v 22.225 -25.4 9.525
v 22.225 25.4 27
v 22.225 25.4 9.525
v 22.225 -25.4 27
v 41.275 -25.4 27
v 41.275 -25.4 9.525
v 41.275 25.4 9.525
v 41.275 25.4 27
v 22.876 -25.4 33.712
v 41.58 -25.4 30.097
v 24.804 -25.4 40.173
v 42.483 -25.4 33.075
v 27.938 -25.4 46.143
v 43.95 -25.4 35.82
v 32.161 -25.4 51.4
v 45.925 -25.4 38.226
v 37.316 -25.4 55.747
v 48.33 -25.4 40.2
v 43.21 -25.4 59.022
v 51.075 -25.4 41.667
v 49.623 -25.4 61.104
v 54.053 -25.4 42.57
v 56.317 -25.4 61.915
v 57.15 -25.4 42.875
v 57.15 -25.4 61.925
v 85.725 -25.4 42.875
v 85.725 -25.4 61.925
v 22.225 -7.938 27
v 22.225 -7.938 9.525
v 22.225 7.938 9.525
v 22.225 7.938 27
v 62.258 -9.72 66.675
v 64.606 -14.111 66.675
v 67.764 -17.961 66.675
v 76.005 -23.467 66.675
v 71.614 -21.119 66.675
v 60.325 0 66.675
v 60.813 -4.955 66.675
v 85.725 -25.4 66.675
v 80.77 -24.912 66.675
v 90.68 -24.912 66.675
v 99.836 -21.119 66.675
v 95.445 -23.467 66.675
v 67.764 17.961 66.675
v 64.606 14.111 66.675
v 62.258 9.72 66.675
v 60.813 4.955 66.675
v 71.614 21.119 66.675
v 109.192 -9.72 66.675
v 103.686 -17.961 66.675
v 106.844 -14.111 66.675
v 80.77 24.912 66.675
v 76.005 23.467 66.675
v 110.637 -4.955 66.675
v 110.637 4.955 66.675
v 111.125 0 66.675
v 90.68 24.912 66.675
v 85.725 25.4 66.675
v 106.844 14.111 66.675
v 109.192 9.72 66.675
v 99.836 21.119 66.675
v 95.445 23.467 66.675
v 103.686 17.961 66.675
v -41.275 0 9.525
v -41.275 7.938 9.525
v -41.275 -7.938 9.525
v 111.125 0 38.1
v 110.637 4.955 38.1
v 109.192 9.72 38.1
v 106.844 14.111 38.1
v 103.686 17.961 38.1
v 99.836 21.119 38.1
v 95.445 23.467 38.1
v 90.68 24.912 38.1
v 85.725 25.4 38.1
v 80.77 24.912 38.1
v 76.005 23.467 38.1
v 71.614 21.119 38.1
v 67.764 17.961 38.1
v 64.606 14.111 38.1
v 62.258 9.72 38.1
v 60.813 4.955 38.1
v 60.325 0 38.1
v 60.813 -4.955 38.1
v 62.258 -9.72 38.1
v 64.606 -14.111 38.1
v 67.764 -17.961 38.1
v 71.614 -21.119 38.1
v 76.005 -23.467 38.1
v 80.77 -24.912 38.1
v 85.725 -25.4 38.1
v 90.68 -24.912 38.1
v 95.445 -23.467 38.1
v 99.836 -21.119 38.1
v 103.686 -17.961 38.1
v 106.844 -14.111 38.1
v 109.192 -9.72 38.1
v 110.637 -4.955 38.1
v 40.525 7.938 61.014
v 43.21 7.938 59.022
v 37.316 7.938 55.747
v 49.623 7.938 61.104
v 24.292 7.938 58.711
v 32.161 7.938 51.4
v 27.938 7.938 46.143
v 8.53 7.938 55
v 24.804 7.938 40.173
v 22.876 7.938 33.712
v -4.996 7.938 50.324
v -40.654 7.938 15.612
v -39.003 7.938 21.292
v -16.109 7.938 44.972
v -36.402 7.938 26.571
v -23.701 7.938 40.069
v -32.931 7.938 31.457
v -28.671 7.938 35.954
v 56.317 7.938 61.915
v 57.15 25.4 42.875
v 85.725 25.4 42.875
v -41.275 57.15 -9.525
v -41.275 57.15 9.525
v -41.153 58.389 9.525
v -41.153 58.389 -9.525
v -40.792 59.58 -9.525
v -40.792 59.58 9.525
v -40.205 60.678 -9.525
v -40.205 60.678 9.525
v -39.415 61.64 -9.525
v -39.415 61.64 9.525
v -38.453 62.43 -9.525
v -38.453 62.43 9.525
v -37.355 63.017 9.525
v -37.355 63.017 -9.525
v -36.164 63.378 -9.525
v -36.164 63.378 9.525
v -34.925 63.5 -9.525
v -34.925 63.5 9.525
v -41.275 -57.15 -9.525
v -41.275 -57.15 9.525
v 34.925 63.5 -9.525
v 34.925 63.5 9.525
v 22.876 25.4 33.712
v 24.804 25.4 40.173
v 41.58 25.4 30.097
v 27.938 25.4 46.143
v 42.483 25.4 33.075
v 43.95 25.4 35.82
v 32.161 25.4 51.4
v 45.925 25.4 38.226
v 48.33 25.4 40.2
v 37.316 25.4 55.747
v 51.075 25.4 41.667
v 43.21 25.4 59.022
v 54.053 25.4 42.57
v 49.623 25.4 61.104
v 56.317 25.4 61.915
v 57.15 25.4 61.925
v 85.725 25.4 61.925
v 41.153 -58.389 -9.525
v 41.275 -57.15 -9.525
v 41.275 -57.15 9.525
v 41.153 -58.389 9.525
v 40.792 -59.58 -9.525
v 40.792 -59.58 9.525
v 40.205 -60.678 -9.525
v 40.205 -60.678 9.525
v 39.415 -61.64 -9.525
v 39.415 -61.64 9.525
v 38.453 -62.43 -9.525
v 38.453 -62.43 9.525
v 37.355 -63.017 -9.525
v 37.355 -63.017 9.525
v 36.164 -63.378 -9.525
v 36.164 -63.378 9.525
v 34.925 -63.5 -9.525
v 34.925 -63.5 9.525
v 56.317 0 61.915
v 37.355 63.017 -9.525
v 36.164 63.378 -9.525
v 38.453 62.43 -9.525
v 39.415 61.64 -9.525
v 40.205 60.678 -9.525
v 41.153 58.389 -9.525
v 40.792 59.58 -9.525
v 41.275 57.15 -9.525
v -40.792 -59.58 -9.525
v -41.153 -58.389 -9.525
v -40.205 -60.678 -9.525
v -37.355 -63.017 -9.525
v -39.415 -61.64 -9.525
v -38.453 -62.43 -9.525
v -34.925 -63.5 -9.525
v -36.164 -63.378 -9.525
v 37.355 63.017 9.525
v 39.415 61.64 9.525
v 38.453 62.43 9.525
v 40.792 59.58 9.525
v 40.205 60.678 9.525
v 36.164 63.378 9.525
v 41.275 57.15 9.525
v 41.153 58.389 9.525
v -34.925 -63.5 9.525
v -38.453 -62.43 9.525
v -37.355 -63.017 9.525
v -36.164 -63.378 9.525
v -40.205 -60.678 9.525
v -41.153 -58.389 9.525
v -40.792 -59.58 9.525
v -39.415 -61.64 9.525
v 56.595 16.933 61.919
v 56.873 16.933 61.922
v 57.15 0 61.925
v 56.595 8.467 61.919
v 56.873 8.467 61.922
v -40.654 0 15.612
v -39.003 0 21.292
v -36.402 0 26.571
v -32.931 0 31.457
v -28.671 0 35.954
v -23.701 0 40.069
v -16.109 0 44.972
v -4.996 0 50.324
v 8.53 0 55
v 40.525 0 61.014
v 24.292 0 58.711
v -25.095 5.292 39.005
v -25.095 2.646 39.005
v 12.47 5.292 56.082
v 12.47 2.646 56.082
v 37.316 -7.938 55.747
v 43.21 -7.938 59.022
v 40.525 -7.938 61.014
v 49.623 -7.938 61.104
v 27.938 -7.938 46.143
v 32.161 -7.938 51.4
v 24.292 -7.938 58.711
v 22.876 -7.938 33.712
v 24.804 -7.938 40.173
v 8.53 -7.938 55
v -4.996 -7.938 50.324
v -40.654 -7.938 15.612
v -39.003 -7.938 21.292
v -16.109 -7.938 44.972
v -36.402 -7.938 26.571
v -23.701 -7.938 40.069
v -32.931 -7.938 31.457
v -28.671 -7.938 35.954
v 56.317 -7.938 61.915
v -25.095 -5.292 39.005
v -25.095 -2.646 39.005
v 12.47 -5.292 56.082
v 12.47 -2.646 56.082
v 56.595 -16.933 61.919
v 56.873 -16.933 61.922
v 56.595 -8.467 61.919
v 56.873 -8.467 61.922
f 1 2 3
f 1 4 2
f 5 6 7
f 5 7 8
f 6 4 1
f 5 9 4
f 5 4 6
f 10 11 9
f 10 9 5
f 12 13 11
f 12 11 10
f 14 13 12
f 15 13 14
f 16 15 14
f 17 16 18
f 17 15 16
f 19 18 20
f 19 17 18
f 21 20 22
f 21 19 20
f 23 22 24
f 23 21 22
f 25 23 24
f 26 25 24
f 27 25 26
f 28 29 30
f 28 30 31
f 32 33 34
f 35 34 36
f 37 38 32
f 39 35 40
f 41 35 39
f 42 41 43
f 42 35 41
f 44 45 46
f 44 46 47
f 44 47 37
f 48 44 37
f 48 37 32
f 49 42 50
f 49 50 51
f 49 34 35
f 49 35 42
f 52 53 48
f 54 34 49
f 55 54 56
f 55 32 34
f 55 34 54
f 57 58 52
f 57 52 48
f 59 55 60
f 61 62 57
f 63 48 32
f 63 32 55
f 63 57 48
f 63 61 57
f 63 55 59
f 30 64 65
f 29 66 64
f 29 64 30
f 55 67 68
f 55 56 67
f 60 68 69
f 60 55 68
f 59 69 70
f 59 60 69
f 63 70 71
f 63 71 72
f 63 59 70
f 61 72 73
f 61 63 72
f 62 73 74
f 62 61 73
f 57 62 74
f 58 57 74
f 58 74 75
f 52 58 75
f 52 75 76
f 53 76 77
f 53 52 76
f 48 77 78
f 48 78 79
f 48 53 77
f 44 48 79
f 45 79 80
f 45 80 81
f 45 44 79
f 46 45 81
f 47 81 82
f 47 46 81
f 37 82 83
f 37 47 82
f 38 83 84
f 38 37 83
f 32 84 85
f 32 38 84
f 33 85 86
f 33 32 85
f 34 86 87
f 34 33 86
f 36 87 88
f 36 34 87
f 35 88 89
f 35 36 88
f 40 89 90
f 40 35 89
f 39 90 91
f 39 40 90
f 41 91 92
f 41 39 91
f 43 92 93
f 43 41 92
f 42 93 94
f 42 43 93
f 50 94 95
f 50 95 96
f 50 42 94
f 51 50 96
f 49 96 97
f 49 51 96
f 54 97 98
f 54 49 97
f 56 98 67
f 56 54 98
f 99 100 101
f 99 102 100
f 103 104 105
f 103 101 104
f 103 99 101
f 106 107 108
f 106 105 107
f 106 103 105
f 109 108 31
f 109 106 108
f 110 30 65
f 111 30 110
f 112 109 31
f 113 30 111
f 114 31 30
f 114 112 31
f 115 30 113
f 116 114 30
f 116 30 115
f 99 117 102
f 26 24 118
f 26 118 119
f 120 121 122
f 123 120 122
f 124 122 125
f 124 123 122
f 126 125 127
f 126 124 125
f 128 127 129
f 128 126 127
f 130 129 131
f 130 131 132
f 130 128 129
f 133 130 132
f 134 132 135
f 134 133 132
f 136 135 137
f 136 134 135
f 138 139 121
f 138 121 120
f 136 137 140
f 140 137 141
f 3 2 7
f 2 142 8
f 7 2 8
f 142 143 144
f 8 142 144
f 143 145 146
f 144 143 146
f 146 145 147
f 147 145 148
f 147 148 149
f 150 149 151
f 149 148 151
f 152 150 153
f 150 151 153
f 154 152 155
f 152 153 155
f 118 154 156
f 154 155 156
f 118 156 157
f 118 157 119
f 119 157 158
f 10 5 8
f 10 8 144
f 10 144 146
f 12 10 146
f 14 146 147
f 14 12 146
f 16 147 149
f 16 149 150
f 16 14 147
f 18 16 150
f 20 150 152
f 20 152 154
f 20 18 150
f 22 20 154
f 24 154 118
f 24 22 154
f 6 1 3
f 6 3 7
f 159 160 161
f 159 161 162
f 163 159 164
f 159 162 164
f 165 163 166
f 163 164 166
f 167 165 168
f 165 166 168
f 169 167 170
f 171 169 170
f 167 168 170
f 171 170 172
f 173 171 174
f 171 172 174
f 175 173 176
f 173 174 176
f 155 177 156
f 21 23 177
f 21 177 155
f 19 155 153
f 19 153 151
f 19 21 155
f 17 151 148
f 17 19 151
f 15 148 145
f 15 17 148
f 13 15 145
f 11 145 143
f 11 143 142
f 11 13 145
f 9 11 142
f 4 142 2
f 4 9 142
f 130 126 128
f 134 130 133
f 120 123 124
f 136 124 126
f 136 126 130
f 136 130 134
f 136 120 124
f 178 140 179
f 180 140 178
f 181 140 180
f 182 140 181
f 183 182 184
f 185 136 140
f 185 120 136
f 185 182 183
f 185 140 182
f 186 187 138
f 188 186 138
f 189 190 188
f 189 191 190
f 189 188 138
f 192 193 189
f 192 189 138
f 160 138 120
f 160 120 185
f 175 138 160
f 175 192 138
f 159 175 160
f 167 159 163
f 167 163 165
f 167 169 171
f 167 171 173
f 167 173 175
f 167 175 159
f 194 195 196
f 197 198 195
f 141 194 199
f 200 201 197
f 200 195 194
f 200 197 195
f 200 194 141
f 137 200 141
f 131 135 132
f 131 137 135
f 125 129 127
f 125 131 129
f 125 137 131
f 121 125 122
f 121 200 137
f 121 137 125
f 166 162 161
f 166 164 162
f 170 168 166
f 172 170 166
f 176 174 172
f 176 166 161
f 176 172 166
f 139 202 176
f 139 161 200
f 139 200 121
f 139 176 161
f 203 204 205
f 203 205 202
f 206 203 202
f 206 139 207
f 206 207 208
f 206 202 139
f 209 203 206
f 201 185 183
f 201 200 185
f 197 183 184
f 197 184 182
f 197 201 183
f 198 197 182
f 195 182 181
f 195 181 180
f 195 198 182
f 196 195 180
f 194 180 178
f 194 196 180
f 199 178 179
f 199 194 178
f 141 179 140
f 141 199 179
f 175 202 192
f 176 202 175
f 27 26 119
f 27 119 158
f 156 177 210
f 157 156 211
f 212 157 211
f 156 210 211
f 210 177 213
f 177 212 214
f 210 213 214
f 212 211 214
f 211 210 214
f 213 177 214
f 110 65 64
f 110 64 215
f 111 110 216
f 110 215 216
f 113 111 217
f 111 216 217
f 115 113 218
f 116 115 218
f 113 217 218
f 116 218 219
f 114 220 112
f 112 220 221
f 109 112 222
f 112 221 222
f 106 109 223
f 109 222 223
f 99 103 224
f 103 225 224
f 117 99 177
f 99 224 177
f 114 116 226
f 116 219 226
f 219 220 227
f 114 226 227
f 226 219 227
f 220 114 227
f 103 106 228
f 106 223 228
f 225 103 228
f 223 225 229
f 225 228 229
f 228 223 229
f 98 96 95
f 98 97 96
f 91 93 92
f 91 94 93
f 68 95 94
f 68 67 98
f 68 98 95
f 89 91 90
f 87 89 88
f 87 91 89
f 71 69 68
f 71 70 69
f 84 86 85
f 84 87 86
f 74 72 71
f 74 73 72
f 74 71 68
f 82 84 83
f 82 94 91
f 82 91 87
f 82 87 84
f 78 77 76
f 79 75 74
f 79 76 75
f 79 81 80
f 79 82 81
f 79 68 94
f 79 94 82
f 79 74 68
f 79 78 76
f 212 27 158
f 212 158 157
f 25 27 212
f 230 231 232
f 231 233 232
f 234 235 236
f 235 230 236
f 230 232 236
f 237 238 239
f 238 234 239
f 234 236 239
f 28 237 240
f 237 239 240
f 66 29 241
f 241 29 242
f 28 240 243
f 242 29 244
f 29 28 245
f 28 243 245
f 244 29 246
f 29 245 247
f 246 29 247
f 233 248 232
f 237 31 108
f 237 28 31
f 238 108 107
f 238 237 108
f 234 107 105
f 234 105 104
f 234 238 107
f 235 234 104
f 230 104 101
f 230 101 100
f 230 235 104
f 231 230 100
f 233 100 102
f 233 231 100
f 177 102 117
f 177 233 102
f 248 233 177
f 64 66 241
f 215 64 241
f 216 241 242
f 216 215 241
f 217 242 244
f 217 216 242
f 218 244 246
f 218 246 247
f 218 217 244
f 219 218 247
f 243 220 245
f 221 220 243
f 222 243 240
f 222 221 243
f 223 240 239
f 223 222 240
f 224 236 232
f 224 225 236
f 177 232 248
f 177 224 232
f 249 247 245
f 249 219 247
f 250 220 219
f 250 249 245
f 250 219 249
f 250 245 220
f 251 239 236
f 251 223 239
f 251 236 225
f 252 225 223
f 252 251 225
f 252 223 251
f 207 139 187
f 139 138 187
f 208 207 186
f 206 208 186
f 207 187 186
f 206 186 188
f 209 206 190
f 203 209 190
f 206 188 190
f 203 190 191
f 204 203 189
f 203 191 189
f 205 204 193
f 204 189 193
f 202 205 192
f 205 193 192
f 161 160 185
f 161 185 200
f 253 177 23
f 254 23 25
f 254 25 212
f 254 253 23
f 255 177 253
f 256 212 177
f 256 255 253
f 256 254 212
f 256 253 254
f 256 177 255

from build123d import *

# Parameters (mm, degrees)
F1_DEPTH = 63.5
F0_W     = 25.4
F0_H     = 19.05
F2_DEPTH = 25.4
F3_DEPTH = 7.9375
F5_R     = 6.35


with BuildPart() as f1:
    # F0 (on Front) → F1 (new body, symmetric)
    with BuildSketch(Plane.XZ):
        Polygon((22.225, 9.525), (-41.275, 9.525), (-41.275, -9.525), (41.275, -9.525), (41.275, 9.525), align=None)
    extrude(amount=F1_DEPTH, both=True)

    # F5
    f5_edges = [f1.edges().sort_by_distance(p)[0] for p in [
        (-41.275, -63.5, 0),
        (41.275, -63.5, 0),
        (-41.275, 63.5, 0),
        (41.275, 63.5, 0),
    ]]
    fillet(f5_edges, radius=F5_R)


with BuildPart() as f2:
    # F0 (on Front) → F2 (new body, symmetric)
    with BuildSketch(Plane.XZ):
        with BuildLine():
            Line((22.225, 27.0002), (22.225, 9.525))
            Line((22.225, 9.525), (41.275, 9.525))
            Line((41.275, 9.525), (41.275, 27.0002))
            ThreePointArc((41.275, 27.0002), (45.9246798487, 38.2255201513), (57.15, 42.8752))
            Line((57.15, 42.8752), (60.325, 42.8752))
            Line((60.325, 42.8752), (60.325, 61.9252))
            Line((60.325, 61.9252), (57.15, 61.9252))
            add(Edge.make_bspline(
                [(56.3168383269, 61.9152607421), (56.5951478112, 61.9192387594), (56.8728749827, 61.9225513366), (57.15, 61.9252)],
                knots=[110.7697111748, 110.7697111748, 110.7697111748, 110.7697111748, 111.5045361635, 111.5045361635, 111.5045361635, 111.5045361635], degree=3))
            ThreePointArc((56.3168383269, 61.9152607421), (32.1614646644, 51.399559147), (22.225, 27.0002))
        make_face()
        with Locations((73.025, 52.4002)):
            Rectangle(F0_W, F0_H)
    extrude(amount=F2_DEPTH, both=True)


with BuildPart() as f3:
    # F0 (on Front) → F3 (new body, symmetric)
    with BuildSketch(Plane.XZ):
        with BuildLine():
            add(Edge.make_bspline(
                [(-41.275, 9.525), (-40.8217216009, 45.5948519834), (14.3636363113, 61.315602548), (56.3168383269, 61.9152607421)],
                knots=[0, 0, 0, 0, 110.7697111748, 110.7697111748, 110.7697111748, 110.7697111748], degree=3))
            Line((-41.275, 9.525), (22.225, 9.525))
            Line((22.225, 9.525), (22.225, 27.0002))
            ThreePointArc((22.225, 27.0002), (32.1614646644, 51.399559147), (56.3168383269, 61.9152607421))
        make_face()
    extrude(amount=F3_DEPTH, both=True)


with BuildPart() as f4:
    # F0 (on Front) → F4 (revolve)
    with BuildSketch(Plane.XZ):
        Polygon((85.725, 66.675), (85.725, 61.9252), (85.725, 42.8752), (85.725, 38.1), (111.125, 38.1), (111.125, 66.675), align=None)
    revolve(axis=Axis((85.725, 0, 52.3875), (0, 0, 1)))


solid = Compound([f1.part, f2.part, f3.part, f4.part])
